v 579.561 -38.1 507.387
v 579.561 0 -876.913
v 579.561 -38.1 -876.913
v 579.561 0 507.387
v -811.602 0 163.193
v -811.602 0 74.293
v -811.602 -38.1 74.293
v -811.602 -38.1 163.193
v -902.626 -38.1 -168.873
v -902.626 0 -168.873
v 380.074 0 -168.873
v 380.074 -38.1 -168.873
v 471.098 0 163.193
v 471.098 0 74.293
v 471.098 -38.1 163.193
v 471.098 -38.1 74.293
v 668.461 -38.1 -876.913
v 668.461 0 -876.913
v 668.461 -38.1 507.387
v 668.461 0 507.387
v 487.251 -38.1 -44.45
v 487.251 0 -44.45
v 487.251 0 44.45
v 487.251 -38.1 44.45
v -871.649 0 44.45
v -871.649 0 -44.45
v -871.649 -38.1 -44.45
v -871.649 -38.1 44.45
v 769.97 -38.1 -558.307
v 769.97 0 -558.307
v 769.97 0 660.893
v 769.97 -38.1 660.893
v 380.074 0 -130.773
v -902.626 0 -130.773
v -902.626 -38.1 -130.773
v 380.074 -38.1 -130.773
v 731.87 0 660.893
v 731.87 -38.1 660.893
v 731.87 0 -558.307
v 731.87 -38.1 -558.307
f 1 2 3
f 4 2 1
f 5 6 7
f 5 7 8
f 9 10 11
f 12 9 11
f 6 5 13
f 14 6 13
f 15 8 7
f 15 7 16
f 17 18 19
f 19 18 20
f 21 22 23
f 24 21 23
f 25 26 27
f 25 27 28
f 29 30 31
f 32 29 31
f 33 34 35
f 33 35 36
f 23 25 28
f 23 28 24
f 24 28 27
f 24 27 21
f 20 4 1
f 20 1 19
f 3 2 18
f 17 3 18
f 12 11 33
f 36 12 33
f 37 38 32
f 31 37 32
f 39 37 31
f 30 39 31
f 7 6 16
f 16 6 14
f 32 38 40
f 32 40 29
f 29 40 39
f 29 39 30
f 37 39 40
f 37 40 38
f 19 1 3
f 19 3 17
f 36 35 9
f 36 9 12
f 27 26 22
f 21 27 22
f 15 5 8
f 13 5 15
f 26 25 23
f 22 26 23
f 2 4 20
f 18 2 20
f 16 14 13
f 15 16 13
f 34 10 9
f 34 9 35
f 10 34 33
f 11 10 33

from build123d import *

# Parameters (mm, degrees)
F0_W     = 1282.7
F0_H     = 88.9
F3_DEPTH = 38.1
F1_W     = 1358.9
F1_H     = 88.9
F4_DEPTH = 38.1
F2_W     = 88.9
F2_H     = 1384.3
F5_DEPTH = 38.1
F6_W     = 1282.7
F6_H     = 38.1
F8_DEPTH = 38.1
F7_W     = 38.1
F7_H     = 1219.2
F9_DEPTH = 38.1


with BuildPart() as f3:
    # F0 (on Front) → F3 (new body)
    with BuildSketch(Plane.XZ):
        with Locations((-170.252413, 118.7431)):
            Rectangle(F0_W, F0_H)
    extrude(amount=F3_DEPTH)


with BuildPart() as f4:
    # F1 (on Front) → F4 (new body)
    with BuildSketch(Plane.XZ):
        with Locations((-192.198903, 0)):
            Rectangle(F1_W, F1_H)
    extrude(amount=F4_DEPTH)


with BuildPart() as f5:
    # F2 (on Front) → F5 (new body)
    with BuildSketch(Plane.XZ):
        with Locations((624.010921, -184.76284)):
            Rectangle(F2_W, F2_H)
    extrude(amount=F5_DEPTH)


with BuildPart() as f8:
    # F6 (on Front) → F8 (new body)
    with BuildSketch(Plane.XZ):
        with Locations((-261.276394, -149.82342)):
            Rectangle(F6_W, F6_H)
    extrude(amount=F8_DEPTH)


with BuildPart() as f9:
    # F7 (on Front) → F9 (new body)
    with BuildSketch(Plane.XZ):
        with Locations((750.920475, 51.292985)):
            Rectangle(F7_W, F7_H)
    extrude(amount=F9_DEPTH)


solid = Compound([f3.part, f4.part, f5.part, f8.part, f9.part])
